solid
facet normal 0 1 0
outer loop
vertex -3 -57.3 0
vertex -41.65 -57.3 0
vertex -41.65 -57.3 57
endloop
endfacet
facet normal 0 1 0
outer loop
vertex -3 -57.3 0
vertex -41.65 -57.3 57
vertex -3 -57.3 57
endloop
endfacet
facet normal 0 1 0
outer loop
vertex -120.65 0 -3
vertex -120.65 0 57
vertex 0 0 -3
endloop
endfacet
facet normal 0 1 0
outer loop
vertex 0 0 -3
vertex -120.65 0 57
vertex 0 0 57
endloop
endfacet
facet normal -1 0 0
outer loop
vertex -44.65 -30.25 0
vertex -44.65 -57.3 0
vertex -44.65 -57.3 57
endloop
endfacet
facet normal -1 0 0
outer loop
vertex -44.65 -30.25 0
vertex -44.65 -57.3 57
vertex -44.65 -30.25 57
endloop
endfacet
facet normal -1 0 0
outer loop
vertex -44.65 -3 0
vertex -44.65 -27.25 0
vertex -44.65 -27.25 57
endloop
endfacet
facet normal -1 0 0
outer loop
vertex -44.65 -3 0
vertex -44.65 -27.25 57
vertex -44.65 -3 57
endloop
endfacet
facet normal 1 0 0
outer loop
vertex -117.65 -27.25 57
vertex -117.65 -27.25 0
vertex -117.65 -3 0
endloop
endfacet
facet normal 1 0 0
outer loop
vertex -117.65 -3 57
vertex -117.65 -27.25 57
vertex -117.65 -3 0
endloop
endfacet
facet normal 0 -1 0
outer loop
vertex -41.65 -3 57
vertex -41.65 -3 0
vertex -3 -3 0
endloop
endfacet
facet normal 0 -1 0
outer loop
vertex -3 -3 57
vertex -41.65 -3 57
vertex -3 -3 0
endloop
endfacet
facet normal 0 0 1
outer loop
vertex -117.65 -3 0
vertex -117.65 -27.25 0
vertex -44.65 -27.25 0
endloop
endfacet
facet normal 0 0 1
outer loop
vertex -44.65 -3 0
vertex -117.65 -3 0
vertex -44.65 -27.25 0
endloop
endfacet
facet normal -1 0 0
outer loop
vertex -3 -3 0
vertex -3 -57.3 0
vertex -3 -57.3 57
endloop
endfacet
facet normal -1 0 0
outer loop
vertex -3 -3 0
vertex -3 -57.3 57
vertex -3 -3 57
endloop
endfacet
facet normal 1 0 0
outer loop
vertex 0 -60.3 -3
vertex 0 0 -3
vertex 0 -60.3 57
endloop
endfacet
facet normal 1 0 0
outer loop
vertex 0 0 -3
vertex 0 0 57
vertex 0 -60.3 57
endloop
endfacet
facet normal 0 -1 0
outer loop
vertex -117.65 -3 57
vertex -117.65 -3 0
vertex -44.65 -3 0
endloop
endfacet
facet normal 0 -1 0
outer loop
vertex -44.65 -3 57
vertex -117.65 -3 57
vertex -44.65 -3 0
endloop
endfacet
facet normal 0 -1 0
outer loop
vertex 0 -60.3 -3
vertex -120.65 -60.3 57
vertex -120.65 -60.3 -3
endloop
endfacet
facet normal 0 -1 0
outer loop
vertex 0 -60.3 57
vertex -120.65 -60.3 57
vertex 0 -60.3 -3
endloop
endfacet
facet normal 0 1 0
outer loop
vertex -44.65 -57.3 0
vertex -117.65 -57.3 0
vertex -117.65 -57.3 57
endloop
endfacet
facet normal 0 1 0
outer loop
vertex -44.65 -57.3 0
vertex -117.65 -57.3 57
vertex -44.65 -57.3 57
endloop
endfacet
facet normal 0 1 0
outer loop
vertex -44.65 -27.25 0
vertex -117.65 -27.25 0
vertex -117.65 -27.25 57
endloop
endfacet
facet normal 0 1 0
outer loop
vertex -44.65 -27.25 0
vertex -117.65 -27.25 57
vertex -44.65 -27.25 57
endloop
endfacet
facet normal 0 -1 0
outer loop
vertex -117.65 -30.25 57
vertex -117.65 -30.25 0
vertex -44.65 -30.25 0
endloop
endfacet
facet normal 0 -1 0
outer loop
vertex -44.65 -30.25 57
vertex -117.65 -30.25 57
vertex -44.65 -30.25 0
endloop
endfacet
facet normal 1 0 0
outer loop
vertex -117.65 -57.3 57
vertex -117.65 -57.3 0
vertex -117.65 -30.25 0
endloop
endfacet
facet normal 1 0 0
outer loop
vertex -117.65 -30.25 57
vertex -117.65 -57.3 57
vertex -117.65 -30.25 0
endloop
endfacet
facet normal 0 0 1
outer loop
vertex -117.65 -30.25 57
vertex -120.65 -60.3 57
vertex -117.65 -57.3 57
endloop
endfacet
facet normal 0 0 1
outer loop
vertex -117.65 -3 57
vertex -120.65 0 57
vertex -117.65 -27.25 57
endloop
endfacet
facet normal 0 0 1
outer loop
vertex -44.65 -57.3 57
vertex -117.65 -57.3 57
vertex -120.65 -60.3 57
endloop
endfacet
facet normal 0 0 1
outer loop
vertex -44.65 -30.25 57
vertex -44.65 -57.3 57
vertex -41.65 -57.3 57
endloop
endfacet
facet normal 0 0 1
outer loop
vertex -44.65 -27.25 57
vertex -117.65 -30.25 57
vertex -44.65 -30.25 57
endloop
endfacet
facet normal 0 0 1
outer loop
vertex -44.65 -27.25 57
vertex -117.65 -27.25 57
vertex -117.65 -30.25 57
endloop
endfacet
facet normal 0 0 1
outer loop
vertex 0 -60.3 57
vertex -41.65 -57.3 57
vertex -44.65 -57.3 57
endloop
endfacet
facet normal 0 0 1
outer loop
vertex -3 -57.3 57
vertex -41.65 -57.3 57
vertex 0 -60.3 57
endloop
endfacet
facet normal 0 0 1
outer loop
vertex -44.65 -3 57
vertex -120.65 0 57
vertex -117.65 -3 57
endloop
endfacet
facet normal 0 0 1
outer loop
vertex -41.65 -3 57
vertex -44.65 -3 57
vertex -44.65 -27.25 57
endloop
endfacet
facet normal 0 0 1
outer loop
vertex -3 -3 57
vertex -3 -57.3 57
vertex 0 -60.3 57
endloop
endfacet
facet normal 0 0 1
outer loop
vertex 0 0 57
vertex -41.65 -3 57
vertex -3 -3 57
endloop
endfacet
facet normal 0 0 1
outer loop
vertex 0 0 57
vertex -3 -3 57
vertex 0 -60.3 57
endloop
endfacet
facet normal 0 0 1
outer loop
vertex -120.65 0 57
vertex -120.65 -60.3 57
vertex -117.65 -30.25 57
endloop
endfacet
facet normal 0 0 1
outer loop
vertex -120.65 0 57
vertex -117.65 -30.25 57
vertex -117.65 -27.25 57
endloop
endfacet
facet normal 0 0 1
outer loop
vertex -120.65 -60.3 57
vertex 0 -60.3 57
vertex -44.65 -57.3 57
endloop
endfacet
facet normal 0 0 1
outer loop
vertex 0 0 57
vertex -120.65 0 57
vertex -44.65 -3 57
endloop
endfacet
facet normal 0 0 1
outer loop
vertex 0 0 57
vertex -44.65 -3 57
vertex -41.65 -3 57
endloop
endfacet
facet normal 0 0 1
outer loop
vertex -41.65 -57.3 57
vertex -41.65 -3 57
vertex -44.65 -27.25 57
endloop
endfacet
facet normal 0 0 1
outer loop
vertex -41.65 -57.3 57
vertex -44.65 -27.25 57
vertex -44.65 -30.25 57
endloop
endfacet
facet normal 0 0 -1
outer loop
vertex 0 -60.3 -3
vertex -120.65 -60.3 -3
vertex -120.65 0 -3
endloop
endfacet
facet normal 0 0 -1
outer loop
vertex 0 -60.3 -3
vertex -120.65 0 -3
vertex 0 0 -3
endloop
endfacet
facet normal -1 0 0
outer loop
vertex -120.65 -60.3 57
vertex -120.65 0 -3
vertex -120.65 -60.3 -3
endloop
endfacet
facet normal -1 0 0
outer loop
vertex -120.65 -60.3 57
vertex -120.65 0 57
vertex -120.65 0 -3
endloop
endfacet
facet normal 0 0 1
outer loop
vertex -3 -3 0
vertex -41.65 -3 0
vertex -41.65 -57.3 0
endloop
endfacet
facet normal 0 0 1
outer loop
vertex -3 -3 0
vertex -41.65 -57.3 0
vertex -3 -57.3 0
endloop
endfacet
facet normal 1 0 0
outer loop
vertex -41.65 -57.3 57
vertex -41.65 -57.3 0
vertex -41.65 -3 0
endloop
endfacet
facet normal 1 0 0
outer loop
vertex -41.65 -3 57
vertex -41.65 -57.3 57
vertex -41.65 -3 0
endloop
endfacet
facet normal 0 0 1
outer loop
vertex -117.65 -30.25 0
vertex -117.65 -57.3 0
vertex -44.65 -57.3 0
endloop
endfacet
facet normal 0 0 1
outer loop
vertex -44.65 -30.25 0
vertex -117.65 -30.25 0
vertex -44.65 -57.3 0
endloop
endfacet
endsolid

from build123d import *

# Parameters (mm, degrees)
F0_W     = 120.65
F0_H     = 60.3
F0_W_2   = 73
F0_H_2   = 27.05
F0_H_3   = 24.25
F0_W_3   = 38.65
F0_H_4   = 54.3
F1_DEPTH = 57
F2_W     = 120.65
F2_H     = 60.3
F2_W_2   = 73
F2_H_2   = 24.25
F2_H_3   = 27.05
F2_W_3   = 38.65
F2_H_4   = 54.3
F3_DEPTH = 3


with BuildPart() as f1:
    # F0 (on Top) → F1 (new body)
    with BuildSketch(Plane.XY):
        with Locations((-60.325, -30.15)):
            Rectangle(F0_W, F0_H)
        with Locations((-81.15, -43.775)):
            Rectangle(F0_W_2, F0_H_2, mode=Mode.SUBTRACT)
        with Locations((-81.15, -15.125)):
            Rectangle(F0_W_2, F0_H_3, mode=Mode.SUBTRACT)
        with Locations((-22.325, -30.15)):
            Rectangle(F0_W_3, F0_H_4, mode=Mode.SUBTRACT)
    extrude(amount=F1_DEPTH)

    # F2 (on face) → F3 (join)
    with BuildSketch(Plane(origin=(0, 0, 0), x_dir=(1, 0, 0), z_dir=(0, 0, -1))):
        with Locations((-60.325, 30.15)):
            Rectangle(F2_W, F2_H)
        with Locations((-81.15, 15.125)):
            Rectangle(F2_W_2, F2_H_2, mode=Mode.SUBTRACT)
        with Locations((-81.15, 43.775)):
            Rectangle(F2_W_2, F2_H_3, mode=Mode.SUBTRACT)
        with Locations((-22.325, 30.15)):
            Rectangle(F2_W_3, F2_H_4, mode=Mode.SUBTRACT)
        with Locations((-81.15, 43.775)):
            Rectangle(F2_W_2, F2_H_3)
        with Locations((-81.15, 15.125)):
            Rectangle(F2_W_2, F2_H_2)
        with Locations((-22.325, 30.15)):
            Rectangle(F2_W_3, F2_H_4)
    extrude(amount=F3_DEPTH)


solid = f1.part
